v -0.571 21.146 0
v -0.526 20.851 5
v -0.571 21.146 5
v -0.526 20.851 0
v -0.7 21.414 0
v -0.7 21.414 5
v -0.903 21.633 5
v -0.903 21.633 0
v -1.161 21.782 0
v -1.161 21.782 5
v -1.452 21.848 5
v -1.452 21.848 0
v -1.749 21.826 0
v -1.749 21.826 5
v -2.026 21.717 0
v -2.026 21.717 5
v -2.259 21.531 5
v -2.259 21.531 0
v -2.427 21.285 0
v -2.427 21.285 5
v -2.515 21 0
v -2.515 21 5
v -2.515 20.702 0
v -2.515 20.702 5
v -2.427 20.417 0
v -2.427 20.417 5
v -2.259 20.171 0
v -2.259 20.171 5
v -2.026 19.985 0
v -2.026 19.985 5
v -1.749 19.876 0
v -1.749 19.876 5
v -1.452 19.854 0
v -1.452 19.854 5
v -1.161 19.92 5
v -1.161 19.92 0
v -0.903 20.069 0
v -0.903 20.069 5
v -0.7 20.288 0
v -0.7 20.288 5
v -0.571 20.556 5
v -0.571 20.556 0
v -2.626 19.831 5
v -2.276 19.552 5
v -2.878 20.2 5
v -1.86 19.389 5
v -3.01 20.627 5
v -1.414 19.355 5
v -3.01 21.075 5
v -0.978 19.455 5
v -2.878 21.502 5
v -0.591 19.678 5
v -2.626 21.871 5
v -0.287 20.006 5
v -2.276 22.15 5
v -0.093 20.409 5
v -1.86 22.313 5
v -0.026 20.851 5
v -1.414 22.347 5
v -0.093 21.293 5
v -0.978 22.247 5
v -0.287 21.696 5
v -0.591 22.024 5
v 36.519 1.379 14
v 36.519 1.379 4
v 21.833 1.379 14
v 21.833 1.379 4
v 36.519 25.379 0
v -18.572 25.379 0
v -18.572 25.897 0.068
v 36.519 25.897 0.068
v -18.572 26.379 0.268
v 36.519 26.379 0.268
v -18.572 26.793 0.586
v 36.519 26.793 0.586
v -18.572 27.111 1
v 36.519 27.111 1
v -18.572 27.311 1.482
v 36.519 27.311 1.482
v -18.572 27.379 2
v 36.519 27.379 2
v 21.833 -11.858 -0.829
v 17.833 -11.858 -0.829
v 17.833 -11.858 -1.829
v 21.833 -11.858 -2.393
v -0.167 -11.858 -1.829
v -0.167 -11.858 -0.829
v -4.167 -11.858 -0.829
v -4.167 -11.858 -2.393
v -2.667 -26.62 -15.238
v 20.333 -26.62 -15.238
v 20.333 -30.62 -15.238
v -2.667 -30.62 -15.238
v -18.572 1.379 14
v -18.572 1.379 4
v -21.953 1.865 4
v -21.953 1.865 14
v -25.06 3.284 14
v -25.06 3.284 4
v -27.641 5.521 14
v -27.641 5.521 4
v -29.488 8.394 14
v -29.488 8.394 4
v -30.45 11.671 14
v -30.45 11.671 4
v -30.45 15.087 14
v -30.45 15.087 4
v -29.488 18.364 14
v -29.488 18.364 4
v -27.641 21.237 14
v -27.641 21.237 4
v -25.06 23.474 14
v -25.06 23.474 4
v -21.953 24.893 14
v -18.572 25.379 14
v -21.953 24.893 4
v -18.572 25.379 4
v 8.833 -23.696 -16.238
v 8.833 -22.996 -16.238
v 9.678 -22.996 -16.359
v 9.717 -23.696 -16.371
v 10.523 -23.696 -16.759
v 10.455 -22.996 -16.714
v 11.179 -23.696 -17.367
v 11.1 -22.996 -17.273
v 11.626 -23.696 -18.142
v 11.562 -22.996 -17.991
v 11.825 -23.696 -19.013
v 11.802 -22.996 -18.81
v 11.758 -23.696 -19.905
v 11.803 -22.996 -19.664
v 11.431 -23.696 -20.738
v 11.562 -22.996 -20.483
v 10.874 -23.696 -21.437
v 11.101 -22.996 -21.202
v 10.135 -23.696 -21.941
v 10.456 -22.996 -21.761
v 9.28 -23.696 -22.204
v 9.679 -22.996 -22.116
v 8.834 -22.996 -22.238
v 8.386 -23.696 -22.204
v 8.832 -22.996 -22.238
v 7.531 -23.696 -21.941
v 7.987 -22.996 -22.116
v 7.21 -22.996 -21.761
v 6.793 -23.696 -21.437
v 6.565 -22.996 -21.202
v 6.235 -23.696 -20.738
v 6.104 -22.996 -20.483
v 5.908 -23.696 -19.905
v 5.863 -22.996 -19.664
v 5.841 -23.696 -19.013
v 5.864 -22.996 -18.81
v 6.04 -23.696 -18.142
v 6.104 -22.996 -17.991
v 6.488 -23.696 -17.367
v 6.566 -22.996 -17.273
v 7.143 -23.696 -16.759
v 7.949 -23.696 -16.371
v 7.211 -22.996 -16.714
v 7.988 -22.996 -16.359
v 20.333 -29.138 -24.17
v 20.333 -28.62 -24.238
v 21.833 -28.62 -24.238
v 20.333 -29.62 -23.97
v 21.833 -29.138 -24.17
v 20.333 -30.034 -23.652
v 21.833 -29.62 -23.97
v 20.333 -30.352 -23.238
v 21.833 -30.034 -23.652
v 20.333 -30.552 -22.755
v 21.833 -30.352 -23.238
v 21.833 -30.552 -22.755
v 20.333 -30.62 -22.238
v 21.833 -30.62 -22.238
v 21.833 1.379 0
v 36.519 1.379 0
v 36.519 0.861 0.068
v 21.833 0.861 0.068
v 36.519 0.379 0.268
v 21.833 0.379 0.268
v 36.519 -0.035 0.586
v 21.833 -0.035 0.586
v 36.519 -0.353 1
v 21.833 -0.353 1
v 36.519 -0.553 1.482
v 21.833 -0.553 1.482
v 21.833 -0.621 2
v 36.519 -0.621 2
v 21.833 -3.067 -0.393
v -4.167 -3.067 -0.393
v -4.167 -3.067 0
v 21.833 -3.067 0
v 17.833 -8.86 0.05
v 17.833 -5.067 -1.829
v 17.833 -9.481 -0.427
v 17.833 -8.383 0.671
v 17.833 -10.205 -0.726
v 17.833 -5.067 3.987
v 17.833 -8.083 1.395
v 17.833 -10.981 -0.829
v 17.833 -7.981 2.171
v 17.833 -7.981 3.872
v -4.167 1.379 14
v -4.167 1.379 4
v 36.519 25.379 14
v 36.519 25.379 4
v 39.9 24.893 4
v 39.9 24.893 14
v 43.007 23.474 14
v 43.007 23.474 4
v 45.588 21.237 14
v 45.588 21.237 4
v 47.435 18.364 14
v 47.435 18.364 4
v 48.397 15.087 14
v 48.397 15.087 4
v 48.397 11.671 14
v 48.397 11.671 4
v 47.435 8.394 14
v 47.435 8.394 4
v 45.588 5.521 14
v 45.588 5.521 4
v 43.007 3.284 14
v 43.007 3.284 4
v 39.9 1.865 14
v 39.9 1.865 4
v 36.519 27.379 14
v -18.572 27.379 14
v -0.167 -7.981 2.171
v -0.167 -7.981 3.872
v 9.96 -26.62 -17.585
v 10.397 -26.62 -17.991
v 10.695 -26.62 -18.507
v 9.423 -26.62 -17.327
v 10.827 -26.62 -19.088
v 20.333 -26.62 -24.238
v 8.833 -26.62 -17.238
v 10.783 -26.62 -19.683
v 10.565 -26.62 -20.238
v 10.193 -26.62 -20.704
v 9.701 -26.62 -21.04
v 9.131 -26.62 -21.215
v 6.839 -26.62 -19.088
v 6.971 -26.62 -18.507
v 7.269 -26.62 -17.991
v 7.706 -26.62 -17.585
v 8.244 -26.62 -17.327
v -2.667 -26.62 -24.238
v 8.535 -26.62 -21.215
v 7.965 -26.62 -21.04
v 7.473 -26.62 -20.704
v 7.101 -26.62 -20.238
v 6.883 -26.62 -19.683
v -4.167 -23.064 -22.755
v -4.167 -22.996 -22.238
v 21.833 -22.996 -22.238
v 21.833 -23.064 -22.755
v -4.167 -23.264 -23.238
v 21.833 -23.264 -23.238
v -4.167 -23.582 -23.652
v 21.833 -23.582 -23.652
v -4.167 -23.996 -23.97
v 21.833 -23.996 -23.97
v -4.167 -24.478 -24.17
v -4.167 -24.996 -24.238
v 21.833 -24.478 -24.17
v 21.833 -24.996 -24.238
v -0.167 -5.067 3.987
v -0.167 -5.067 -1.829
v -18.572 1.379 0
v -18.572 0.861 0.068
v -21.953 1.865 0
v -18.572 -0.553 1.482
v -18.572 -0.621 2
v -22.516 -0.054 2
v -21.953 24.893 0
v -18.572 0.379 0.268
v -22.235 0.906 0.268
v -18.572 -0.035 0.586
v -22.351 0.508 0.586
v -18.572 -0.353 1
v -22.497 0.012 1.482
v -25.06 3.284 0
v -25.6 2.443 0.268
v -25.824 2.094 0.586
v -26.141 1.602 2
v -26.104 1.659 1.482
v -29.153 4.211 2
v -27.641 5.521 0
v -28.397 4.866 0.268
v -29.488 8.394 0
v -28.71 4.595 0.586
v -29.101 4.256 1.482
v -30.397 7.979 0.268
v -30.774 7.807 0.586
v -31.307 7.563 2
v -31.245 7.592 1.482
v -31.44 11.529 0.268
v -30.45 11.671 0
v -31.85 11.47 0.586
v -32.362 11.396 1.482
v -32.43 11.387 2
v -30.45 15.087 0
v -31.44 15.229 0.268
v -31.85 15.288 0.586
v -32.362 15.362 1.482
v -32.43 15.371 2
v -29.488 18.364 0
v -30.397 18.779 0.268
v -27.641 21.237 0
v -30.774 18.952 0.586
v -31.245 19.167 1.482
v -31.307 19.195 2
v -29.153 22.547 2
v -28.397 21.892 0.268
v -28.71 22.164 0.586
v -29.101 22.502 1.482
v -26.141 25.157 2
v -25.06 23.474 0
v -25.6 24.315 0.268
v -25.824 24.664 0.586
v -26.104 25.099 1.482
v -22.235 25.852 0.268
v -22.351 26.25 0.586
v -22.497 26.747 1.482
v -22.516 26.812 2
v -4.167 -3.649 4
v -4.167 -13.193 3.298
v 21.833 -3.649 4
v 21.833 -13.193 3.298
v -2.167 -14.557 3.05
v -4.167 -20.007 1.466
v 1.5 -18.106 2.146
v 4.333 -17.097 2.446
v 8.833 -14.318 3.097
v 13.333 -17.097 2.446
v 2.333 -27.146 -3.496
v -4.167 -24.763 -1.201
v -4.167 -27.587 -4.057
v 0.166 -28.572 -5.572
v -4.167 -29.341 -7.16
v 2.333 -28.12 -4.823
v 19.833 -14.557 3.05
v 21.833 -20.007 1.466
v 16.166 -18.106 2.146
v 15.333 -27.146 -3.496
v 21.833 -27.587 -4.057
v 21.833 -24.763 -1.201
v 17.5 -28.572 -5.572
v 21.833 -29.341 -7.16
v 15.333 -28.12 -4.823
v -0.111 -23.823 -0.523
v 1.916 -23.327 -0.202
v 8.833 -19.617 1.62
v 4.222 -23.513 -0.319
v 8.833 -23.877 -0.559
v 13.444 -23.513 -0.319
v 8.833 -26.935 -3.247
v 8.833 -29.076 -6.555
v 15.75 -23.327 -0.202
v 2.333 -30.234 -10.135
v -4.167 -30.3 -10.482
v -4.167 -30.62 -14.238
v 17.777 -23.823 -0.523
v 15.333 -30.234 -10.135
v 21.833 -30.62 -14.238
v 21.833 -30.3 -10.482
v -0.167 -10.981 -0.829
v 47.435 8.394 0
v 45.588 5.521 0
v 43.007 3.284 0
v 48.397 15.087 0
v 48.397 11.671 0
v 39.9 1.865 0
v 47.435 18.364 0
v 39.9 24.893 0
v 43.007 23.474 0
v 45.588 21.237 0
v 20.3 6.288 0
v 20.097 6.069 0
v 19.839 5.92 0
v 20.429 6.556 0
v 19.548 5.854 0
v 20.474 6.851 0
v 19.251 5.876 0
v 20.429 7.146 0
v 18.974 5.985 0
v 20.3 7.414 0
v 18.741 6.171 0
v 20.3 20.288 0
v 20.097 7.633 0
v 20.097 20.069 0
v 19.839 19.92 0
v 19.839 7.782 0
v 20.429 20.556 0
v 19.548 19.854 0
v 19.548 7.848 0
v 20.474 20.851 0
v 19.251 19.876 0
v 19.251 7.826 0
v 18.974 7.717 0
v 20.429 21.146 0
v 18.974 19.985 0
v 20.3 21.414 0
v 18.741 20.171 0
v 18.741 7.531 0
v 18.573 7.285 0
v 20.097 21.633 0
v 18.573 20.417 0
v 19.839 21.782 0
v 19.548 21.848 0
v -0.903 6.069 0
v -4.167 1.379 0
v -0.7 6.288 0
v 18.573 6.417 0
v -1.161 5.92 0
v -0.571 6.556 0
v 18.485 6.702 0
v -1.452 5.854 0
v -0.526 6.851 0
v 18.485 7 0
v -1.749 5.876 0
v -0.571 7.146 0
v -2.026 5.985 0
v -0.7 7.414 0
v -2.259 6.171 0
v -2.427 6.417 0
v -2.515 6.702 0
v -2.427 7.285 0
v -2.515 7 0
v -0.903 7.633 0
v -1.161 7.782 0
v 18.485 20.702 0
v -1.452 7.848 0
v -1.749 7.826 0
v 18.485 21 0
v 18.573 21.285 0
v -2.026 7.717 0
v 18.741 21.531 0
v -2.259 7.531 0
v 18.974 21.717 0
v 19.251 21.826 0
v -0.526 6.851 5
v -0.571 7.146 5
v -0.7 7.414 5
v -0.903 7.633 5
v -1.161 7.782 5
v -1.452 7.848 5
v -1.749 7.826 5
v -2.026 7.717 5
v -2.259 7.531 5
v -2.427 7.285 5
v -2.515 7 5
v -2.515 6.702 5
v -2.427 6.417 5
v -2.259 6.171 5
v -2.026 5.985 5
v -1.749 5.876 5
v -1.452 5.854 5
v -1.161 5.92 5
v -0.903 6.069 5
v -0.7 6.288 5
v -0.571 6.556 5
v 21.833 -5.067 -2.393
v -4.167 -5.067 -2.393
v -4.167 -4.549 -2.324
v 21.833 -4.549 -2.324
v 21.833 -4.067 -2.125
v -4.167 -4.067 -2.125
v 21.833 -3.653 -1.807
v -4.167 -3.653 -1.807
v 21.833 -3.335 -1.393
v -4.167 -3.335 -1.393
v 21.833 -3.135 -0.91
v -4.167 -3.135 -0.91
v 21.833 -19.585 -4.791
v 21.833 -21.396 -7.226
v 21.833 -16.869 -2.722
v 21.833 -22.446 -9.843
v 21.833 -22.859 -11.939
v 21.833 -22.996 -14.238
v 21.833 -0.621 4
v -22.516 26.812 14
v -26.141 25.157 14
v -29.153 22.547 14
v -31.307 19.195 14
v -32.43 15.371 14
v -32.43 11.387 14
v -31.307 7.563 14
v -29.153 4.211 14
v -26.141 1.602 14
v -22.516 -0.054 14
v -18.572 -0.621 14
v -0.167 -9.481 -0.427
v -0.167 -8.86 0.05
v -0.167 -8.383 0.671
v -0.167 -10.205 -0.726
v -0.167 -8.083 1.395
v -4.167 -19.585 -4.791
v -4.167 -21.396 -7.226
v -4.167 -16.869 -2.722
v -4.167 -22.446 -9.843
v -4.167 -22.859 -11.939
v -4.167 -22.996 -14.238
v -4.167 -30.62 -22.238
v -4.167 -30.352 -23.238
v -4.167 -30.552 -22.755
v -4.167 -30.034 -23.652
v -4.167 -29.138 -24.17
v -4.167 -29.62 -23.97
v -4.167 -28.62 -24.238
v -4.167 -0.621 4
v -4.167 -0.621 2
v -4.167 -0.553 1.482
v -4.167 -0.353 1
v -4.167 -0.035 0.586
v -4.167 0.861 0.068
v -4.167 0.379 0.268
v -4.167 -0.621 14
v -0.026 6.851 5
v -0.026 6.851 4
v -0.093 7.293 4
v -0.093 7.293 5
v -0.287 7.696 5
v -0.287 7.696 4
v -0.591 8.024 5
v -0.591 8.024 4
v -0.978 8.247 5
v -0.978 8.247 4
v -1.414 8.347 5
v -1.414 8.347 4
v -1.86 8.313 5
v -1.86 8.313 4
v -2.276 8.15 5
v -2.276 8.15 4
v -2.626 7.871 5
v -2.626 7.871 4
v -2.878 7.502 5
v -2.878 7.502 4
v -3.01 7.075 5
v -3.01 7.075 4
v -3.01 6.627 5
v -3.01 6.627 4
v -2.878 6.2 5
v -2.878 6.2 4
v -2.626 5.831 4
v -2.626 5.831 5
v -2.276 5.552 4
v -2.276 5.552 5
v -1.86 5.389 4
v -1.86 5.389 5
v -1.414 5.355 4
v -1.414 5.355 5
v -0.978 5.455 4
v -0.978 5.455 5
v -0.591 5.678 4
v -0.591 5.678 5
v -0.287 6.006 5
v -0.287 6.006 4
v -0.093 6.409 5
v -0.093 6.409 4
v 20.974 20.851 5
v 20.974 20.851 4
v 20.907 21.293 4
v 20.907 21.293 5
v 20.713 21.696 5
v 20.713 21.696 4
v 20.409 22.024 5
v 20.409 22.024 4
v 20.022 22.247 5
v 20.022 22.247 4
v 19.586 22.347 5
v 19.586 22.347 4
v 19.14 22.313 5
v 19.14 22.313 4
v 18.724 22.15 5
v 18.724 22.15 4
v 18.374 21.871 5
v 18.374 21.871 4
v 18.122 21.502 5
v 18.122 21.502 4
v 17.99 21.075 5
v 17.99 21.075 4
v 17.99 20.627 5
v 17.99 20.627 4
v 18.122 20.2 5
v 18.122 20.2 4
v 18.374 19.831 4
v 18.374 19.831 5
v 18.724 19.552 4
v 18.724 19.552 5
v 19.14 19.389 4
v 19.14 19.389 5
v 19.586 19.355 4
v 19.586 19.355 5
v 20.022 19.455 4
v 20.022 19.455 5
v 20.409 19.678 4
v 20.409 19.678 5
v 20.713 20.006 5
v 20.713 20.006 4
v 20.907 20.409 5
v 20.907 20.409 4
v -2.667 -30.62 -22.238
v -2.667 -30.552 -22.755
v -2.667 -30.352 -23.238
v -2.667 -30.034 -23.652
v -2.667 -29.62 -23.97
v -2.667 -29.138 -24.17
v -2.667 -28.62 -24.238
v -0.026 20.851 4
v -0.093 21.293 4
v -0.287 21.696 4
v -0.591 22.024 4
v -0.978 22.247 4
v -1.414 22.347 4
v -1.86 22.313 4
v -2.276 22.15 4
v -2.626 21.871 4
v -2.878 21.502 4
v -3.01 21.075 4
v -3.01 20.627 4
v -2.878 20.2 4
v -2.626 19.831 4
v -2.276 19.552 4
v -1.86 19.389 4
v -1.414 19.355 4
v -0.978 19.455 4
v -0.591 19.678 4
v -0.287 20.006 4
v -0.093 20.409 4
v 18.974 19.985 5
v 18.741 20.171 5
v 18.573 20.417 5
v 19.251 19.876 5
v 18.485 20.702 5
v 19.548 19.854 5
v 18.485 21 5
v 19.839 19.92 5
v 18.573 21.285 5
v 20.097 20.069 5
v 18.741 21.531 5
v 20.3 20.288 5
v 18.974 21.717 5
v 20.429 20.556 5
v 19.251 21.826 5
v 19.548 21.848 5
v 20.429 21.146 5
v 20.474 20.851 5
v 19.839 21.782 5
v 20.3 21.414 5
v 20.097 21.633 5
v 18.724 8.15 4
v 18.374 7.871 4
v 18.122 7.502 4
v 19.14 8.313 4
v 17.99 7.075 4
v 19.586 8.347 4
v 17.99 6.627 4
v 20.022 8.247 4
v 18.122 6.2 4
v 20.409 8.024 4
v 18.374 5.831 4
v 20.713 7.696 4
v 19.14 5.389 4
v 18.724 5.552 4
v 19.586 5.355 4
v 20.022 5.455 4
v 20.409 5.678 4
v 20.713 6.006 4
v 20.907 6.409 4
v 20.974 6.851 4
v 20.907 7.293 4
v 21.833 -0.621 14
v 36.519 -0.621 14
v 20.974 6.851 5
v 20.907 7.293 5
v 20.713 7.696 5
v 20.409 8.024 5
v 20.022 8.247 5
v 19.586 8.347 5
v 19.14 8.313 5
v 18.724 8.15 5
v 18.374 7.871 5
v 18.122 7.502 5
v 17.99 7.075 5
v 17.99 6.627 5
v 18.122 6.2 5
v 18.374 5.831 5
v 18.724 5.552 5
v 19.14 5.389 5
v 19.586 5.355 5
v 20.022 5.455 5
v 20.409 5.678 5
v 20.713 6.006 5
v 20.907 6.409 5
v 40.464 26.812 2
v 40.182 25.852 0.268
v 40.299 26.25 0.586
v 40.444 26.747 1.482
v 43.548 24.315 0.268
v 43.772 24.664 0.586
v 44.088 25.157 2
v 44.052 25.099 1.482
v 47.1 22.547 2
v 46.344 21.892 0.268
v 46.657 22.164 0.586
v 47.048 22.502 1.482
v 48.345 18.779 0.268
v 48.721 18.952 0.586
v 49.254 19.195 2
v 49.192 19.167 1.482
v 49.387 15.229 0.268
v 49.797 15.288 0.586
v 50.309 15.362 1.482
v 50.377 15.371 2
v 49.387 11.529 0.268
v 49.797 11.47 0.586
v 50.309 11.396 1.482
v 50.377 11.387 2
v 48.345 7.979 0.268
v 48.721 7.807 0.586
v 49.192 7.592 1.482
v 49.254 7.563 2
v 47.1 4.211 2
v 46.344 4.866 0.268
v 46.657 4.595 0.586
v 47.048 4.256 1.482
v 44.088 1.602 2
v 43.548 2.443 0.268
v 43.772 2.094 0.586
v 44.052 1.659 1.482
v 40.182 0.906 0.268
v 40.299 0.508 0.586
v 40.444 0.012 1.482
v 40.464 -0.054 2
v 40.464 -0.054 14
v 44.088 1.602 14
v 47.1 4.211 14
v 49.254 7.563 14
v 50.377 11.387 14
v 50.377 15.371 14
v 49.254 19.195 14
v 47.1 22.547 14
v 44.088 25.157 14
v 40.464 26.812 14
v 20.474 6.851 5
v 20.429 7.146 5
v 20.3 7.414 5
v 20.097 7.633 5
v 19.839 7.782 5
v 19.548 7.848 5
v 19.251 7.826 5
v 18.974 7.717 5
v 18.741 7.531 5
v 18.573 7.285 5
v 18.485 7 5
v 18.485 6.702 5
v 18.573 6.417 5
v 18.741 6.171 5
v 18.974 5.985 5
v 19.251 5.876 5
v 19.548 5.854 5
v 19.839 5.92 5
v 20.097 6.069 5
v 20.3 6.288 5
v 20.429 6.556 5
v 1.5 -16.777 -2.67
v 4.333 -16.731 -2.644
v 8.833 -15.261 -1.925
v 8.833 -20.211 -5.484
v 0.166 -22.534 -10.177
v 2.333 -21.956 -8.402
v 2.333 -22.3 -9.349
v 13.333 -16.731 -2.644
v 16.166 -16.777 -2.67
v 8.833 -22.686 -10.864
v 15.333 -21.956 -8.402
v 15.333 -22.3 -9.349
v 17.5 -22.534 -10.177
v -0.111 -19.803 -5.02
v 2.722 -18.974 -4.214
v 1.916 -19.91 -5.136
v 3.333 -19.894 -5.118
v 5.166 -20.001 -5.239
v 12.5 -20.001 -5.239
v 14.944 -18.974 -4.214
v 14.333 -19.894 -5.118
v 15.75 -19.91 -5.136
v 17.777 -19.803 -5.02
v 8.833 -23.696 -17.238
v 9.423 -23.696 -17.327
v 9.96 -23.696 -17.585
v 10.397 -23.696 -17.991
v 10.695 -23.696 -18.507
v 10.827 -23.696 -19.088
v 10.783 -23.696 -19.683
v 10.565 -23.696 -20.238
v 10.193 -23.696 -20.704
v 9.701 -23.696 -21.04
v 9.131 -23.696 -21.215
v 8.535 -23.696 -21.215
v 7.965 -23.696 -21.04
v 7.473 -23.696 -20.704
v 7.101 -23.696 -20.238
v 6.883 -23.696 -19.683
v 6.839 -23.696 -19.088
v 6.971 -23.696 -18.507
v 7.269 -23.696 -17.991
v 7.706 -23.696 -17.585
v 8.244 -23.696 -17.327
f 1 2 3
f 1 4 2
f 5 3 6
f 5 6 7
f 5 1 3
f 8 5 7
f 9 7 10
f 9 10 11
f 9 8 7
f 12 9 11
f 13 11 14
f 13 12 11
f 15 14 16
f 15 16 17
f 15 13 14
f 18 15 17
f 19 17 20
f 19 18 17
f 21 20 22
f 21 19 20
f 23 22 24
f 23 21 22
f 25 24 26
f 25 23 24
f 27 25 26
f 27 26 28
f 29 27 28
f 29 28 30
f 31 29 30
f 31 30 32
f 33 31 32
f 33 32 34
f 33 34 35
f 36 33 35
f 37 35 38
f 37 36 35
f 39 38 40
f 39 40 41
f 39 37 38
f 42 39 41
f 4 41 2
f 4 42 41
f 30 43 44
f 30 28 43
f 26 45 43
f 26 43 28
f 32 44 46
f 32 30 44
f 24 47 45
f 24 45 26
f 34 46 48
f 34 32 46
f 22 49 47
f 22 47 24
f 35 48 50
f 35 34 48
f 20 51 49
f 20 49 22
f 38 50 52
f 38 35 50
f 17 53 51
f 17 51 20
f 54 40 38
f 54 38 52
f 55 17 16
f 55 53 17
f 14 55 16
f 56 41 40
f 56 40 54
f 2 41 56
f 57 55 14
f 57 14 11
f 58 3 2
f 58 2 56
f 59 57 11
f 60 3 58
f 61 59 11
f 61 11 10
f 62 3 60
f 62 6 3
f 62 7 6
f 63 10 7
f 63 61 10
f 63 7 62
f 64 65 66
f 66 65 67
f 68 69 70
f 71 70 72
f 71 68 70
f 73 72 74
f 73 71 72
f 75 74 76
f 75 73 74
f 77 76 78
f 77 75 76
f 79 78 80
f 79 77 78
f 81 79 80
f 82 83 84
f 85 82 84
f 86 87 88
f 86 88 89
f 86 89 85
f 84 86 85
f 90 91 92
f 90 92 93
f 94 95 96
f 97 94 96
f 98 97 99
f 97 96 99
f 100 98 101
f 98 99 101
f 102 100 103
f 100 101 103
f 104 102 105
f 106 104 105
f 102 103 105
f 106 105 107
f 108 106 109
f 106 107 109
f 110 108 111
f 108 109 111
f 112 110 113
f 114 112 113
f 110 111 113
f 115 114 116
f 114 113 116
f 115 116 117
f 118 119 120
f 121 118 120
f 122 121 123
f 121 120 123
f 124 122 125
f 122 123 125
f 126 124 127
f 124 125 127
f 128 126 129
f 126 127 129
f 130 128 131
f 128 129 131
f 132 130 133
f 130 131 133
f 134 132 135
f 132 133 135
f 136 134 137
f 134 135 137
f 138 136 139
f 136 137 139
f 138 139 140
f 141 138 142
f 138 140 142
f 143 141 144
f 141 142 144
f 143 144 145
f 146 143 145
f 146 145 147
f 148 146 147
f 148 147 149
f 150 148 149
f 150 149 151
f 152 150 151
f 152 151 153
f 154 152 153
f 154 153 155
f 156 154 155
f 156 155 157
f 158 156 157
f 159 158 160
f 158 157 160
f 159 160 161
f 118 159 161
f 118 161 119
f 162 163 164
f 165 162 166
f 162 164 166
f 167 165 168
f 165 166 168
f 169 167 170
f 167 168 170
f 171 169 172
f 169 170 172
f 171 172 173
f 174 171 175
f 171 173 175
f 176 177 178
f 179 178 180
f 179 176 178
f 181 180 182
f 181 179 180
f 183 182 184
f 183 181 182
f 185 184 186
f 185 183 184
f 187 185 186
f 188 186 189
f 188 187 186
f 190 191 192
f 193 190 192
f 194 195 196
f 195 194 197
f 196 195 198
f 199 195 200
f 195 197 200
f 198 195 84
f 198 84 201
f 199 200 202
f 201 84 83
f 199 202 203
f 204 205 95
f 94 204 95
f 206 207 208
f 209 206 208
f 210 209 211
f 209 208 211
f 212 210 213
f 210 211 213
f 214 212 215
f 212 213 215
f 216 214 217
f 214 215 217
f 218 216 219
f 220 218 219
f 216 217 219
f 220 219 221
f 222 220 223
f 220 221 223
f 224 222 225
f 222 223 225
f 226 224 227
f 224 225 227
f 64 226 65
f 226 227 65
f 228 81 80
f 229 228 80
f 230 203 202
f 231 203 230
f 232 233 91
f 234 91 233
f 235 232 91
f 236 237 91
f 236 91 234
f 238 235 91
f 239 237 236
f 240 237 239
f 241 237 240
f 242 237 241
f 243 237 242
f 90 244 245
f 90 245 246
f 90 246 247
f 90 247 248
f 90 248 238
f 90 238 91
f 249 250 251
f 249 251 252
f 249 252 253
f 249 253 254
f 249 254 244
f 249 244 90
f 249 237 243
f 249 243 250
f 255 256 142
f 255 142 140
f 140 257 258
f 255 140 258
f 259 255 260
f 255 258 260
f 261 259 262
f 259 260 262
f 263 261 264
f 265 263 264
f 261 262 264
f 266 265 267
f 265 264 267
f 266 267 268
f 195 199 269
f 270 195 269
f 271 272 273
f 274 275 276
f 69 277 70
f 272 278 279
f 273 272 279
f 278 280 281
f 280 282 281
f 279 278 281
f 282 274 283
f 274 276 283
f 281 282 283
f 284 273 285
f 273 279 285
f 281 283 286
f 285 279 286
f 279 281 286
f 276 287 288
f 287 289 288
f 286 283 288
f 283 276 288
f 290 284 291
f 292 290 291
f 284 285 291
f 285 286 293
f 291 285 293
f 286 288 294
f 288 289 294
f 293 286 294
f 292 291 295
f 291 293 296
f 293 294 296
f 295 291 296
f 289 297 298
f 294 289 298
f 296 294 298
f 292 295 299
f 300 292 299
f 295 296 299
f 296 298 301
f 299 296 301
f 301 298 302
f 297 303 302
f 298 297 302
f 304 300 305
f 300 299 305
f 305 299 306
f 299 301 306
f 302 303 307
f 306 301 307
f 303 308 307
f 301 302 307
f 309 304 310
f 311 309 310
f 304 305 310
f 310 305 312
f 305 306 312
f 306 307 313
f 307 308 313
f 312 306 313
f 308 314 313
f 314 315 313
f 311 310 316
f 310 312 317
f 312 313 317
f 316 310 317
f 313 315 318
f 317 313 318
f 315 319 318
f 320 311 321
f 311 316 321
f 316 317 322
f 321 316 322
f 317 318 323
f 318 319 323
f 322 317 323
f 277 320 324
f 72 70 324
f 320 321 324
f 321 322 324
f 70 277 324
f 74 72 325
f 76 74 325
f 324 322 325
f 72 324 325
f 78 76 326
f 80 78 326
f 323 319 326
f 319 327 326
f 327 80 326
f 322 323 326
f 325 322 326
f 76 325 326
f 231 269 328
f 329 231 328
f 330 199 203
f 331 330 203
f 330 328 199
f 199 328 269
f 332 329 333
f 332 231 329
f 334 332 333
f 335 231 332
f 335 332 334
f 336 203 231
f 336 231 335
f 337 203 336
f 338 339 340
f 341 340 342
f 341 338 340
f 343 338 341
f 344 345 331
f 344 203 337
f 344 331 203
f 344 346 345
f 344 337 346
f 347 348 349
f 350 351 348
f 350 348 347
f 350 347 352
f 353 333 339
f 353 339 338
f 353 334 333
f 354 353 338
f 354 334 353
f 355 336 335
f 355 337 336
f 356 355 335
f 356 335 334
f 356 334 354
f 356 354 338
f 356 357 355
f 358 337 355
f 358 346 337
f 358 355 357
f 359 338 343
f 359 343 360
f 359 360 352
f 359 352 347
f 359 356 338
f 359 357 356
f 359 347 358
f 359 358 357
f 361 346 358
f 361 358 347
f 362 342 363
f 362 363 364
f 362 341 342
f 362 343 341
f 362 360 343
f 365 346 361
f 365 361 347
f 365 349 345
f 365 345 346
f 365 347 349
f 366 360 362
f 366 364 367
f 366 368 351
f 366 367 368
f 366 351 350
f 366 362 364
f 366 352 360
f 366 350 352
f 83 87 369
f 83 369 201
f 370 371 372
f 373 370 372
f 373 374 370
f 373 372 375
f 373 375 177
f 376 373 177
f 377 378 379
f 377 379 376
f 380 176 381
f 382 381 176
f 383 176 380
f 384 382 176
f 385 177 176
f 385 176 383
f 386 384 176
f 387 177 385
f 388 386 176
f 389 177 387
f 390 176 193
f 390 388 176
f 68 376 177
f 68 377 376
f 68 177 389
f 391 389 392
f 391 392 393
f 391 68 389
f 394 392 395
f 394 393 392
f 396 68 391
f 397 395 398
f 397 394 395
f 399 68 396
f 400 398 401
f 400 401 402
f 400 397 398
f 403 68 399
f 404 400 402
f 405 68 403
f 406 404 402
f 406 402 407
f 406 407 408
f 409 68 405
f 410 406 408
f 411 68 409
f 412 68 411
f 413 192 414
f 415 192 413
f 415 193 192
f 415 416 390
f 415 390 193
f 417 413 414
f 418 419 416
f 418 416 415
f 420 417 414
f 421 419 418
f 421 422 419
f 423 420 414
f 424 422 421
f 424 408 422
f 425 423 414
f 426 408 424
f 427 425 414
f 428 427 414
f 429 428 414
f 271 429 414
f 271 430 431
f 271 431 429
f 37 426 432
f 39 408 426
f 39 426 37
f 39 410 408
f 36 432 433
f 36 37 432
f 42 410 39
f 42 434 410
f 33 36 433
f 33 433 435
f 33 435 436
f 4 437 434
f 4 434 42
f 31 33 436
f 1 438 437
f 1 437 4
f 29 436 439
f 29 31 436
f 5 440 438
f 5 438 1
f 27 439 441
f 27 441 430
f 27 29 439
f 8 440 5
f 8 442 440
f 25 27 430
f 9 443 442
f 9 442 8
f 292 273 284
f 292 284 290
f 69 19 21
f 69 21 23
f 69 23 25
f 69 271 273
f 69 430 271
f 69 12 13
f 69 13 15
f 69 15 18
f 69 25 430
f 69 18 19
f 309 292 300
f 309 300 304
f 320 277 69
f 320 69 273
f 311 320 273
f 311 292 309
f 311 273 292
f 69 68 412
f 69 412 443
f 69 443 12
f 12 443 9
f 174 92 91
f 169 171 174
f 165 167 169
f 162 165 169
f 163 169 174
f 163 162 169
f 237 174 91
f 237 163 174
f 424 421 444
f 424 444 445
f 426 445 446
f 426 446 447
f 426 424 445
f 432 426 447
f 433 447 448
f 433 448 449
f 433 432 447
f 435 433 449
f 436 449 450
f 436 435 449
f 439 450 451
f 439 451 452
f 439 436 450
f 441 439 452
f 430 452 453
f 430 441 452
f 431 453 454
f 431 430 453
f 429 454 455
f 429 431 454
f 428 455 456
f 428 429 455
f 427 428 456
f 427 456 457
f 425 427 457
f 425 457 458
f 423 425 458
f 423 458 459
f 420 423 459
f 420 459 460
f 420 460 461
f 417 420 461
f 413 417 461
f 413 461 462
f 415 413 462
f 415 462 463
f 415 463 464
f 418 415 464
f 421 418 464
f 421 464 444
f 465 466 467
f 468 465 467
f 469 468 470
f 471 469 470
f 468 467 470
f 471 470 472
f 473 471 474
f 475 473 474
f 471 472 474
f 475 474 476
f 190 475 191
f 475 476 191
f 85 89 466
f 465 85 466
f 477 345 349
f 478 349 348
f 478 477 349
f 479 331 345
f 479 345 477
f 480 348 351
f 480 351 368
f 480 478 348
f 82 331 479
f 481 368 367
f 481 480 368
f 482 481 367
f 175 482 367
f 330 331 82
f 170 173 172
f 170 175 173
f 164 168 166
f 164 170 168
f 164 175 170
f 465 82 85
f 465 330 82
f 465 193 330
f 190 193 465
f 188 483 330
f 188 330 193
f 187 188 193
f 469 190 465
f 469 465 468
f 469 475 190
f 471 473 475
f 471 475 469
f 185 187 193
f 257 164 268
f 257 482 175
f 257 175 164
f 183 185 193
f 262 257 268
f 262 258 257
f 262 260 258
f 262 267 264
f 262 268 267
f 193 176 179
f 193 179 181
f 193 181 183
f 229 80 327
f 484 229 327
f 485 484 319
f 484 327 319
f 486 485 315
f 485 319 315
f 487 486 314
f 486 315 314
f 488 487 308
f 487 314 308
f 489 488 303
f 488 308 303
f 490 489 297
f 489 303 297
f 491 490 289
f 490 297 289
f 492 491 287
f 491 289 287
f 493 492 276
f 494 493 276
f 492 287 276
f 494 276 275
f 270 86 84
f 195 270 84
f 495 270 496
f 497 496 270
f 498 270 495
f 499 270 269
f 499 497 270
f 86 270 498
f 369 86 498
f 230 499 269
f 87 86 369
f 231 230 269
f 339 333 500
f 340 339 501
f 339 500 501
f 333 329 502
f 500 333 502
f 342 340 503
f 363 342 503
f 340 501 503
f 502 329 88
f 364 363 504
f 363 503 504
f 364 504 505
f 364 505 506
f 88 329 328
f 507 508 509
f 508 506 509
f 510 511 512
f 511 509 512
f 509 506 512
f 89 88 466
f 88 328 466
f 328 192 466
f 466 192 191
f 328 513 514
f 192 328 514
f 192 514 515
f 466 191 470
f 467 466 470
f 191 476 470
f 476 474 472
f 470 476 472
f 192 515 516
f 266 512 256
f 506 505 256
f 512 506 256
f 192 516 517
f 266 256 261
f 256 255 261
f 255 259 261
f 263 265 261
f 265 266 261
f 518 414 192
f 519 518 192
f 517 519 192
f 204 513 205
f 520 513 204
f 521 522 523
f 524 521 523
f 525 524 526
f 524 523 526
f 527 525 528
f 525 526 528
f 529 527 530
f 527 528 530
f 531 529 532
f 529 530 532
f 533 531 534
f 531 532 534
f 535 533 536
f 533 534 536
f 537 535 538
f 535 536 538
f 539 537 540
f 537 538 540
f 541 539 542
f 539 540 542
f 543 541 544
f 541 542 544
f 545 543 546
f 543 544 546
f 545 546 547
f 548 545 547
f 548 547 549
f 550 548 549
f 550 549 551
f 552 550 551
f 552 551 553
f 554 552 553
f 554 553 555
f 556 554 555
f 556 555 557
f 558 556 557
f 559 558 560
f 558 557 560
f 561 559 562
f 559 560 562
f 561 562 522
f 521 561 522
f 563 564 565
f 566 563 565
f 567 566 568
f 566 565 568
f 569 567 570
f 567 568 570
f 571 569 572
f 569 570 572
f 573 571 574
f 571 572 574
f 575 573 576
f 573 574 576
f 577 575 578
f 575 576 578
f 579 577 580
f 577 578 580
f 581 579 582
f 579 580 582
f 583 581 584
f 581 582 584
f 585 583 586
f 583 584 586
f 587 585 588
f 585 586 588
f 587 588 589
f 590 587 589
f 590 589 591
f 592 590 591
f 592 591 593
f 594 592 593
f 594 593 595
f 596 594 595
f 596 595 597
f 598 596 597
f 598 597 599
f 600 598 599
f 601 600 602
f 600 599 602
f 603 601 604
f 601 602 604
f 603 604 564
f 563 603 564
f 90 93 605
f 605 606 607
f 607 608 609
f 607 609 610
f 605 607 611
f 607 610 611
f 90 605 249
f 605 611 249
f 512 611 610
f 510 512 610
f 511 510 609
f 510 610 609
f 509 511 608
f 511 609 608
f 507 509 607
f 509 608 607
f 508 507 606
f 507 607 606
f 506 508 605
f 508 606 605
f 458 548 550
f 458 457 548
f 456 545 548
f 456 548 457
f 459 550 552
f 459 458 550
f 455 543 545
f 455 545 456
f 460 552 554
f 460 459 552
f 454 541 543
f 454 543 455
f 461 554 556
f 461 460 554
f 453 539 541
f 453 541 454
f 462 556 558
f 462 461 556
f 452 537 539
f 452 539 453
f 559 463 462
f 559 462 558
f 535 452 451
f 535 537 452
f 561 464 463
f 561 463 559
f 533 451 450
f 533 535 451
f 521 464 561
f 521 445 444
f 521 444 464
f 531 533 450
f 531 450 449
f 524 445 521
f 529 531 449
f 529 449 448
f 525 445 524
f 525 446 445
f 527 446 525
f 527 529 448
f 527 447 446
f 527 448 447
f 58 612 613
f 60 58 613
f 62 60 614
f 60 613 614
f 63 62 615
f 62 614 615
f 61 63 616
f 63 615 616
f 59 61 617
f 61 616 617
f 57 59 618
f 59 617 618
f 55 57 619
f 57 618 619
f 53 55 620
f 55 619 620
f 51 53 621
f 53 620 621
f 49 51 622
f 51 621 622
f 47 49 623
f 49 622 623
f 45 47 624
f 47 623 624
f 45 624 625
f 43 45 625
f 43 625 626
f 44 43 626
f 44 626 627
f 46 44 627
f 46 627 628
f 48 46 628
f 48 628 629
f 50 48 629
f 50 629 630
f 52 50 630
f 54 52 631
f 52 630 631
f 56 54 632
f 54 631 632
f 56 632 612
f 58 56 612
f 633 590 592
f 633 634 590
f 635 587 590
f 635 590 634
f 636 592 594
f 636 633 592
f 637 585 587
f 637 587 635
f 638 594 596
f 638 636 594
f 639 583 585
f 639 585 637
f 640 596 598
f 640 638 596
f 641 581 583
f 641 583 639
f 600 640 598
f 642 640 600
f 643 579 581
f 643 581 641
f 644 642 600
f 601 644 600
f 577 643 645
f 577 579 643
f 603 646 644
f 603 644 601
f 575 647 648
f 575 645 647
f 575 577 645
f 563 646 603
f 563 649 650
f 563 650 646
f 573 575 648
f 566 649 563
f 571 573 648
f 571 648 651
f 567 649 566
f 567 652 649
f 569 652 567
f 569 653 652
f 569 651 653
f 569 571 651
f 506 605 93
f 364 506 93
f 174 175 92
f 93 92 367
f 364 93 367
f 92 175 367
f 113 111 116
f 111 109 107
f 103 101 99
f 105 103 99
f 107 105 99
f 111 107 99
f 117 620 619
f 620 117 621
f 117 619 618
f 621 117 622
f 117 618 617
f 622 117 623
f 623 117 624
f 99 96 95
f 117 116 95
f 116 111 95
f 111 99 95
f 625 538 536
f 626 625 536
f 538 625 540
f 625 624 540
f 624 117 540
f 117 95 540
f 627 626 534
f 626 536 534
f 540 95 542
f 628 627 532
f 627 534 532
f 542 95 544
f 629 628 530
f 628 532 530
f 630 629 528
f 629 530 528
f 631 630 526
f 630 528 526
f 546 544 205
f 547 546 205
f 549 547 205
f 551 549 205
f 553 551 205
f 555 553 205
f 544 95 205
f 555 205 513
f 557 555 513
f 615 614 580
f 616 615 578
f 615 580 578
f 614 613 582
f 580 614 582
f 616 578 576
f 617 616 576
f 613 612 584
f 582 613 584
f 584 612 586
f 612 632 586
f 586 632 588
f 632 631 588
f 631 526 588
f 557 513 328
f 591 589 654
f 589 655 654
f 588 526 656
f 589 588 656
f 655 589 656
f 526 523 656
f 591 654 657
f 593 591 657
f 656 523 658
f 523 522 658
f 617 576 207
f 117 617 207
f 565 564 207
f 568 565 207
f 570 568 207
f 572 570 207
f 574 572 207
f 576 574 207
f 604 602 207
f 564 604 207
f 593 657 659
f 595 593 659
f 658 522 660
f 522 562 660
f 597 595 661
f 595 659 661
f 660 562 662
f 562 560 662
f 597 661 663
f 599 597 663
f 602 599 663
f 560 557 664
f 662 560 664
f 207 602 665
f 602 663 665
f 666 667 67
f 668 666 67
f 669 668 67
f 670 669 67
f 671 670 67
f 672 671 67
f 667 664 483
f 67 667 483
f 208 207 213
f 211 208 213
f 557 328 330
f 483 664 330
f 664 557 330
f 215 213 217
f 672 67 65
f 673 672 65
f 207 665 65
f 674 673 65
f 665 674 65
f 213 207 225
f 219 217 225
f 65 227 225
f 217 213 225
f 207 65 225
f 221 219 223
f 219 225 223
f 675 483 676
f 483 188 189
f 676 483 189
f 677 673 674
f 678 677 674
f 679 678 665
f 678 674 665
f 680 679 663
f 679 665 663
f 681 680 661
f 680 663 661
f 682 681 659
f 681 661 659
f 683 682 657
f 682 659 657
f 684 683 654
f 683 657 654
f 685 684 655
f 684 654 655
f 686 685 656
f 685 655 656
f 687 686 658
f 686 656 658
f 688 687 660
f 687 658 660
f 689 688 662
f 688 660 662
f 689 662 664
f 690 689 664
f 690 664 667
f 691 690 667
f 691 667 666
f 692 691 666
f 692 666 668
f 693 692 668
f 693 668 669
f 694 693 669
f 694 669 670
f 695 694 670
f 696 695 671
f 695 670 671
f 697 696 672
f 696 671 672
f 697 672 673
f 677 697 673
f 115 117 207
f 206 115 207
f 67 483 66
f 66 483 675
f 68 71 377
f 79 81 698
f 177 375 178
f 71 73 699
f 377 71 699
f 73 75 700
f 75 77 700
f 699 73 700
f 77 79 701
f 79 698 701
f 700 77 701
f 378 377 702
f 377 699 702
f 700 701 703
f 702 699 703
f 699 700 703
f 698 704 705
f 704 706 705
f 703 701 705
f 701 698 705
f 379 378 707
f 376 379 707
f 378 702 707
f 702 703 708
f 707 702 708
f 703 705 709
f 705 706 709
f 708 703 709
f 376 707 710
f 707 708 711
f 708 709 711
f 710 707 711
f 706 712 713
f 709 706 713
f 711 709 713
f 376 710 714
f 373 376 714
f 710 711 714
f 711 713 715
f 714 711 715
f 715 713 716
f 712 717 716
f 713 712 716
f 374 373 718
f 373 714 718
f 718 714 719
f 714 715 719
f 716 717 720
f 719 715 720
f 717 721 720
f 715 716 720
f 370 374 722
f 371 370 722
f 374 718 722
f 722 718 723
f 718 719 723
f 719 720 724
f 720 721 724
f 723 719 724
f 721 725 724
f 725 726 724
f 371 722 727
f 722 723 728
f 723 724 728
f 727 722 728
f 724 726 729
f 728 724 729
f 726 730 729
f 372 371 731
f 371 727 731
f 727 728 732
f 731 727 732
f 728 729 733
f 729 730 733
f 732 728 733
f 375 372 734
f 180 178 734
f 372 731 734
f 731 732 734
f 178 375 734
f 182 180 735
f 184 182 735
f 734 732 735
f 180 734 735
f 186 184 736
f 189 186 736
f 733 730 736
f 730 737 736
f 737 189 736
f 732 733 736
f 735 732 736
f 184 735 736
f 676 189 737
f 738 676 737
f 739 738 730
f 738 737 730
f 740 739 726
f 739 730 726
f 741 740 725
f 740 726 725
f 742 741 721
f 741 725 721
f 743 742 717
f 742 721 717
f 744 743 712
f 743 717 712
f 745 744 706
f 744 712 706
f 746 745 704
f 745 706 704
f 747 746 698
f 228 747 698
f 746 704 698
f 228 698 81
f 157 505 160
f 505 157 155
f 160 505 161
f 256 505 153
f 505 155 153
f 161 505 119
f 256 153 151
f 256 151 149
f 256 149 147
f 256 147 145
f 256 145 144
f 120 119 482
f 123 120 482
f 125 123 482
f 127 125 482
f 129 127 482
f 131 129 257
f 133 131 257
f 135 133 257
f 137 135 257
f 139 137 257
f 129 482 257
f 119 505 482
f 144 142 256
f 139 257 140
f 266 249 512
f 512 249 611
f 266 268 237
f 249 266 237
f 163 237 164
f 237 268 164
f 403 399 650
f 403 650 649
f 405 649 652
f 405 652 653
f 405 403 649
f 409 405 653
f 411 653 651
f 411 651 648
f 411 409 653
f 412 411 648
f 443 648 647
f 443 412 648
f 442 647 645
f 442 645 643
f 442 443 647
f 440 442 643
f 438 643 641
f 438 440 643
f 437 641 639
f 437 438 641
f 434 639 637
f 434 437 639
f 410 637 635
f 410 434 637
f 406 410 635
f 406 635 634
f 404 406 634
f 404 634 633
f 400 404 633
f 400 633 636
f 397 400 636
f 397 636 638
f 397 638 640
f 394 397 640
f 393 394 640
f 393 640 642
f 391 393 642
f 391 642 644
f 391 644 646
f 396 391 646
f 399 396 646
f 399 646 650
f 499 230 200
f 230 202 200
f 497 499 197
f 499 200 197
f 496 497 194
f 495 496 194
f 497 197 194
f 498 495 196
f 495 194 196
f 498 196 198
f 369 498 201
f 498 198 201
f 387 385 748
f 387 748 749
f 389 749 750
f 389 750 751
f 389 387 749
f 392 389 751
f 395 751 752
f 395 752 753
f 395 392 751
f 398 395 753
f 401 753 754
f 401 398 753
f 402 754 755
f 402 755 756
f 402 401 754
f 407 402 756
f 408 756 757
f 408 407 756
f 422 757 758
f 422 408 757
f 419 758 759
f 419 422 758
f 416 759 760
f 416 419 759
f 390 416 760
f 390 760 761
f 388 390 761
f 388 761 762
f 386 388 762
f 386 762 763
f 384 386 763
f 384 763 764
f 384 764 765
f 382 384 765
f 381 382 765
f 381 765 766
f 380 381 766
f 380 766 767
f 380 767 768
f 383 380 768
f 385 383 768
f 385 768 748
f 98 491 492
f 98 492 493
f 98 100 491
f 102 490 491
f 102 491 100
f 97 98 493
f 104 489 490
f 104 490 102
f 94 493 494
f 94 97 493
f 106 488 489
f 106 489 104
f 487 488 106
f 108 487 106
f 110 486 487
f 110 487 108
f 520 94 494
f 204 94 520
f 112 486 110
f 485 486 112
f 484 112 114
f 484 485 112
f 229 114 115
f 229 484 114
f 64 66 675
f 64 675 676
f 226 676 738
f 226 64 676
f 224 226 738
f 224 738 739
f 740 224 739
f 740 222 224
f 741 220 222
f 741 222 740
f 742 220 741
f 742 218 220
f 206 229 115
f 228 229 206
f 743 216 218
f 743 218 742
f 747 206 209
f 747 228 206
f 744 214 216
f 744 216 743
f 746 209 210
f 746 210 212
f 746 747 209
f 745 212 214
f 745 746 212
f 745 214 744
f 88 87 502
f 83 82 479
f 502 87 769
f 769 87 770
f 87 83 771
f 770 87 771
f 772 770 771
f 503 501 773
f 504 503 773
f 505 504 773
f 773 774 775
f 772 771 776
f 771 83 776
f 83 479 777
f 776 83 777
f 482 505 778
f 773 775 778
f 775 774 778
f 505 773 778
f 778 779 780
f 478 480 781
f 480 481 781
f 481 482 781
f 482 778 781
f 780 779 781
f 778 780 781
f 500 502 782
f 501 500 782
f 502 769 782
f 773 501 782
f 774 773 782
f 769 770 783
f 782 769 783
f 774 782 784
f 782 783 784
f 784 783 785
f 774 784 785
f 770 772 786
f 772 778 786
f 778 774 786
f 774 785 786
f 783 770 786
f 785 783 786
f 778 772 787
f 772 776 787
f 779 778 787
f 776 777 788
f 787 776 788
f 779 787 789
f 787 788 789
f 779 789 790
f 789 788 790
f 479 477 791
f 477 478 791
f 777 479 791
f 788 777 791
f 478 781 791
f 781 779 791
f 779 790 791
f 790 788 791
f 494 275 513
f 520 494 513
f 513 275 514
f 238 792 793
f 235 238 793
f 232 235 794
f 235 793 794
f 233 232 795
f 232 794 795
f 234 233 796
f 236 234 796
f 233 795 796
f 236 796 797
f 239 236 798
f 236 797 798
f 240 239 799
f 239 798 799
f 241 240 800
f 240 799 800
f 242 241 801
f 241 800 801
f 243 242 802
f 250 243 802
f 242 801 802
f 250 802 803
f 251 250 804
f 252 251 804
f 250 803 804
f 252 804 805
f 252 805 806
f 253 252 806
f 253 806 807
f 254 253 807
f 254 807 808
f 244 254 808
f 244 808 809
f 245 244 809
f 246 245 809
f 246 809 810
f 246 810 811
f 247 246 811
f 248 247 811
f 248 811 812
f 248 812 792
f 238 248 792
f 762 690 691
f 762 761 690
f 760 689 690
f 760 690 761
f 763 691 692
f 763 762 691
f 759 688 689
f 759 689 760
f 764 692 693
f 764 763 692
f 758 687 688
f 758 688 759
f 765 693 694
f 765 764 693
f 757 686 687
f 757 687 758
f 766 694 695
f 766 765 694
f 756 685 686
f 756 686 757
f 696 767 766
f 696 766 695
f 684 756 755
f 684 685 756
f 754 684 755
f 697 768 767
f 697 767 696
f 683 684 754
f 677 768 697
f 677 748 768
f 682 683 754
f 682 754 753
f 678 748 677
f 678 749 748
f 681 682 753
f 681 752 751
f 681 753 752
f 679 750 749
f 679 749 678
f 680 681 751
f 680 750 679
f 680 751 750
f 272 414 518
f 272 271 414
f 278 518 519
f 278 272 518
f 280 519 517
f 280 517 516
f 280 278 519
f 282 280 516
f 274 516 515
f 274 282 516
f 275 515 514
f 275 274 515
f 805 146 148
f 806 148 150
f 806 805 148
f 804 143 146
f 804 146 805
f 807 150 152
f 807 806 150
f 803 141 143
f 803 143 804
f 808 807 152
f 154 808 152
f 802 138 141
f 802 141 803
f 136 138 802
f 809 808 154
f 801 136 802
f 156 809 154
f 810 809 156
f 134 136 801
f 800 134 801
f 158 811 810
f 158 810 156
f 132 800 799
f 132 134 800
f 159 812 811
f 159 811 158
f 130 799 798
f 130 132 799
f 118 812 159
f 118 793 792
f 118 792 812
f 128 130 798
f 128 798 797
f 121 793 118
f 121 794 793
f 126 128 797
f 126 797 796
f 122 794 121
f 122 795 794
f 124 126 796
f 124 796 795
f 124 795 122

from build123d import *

# Parameters (mm, degrees)
SKETCH1_R                = 1
BOSS_EXTRUDE2_DEPTH      = 4
BOSS_EXTRUDE3_DEPTH      = 10
SKETCH3_W                = 26
SKETCH3_H                = 10
CUT_EXTRUDE1_DEPTH       = 10
BOSS_EXTRUDE4_DEPTH      = 26
SKETCH8_W                = 23
SKETCH8_H                = 4
CUT_EXTRUDE5_DEPTH       = 9
SKETCH10_R               = 3
CUT_EXTRUDE7_DEPTH       = 0.7
SKETCH11_R               = 2
CUT_EXTRUDE8_DEPTH       = 10.7
BOSS_EXTRUDE5_START      = -26
BOSS_EXTRUDE5_DEPTH      = 26
SKETCH14_W               = 18
SKETCH14_H               = 1
CUT_EXTRUDE10_DEPTH      = 5
CUT_EXTRUDE11_DEPTH      = 1
CUT_EXTRUDE11_DEPTH_BACK = 5.5
SKETCH15_W               = 18
SKETCH15_H               = 2.914160071
SKETCH16_R               = 1.5
SKETCH16_R_2             = 1
BOSS_EXTRUDE6_DEPTH      = 1
FILLET3_R                = 2
FILLET4_R                = 3


# Read off the part's stored shape, not the designer's step: Boss-Extrude5
with BuildPart() as part:
    # Sketch1 → Boss-Extrude2 (new body)
    with BuildSketch(Plane.XY):
        with BuildLine():
            Line((-18.57209146, 27.379059863), (36.519389128, 27.379059863))
            ThreePointArc((36.519389128, 27.379059863), (50.519389128, 13.379059863), (36.519389128, -0.620940137))
            Line((36.519389128, -0.620940137), (21.833027405, -0.620940137))
            Line((21.833027405, -0.620940137), (21.833027405, -3.648981121))
            Line((21.833027405, -3.648981121), (-4.166972595, -3.648981121))
            Line((-4.166972595, -3.648981121), (-4.166972595, -0.620940137))
            Line((-4.166972595, -0.620940137), (-18.57209146, -0.620940137))
            ThreePointArc((-18.57209146, -0.620940137), (-32.57209146, 13.379059863), (-18.57209146, 27.379059863))
        make_face()
        with Locations((-1.526351166, 20.851018883)):
            Circle(SKETCH1_R, mode=Mode.SUBTRACT)
        with Locations((19.473648834, 20.851018883)):
            Circle(SKETCH1_R, mode=Mode.SUBTRACT)
        with Locations((-1.526351166, 6.851018883)):
            Circle(SKETCH1_R, mode=Mode.SUBTRACT)
        with Locations((19.473648834, 6.851018883)):
            Circle(SKETCH1_R, mode=Mode.SUBTRACT)
    extrude(amount=BOSS_EXTRUDE2_DEPTH)

    # Sketch2 → Boss-Extrude3 (add)
    with BuildSketch(Plane.XY.offset(4)):
        with BuildLine():
            Line((-4.166972595, -0.620940137), (-4.166972595, -0.624002345))
            Line((-4.166972595, -0.624002345), (21.833027405, -0.624002345))
            Line((21.833027405, -0.624002345), (21.833027405, -0.620940137))
            Line((21.833027405, -0.620940137), (36.519389128, -0.620940137))
            ThreePointArc((36.519389128, -0.620940137), (50.519389128, 13.379059863), (36.519389128, 27.379059863))
            Line((36.519389128, 27.379059863), (-18.57209146, 27.379059863))
            ThreePointArc((-18.57209146, 27.379059863), (-32.57209146, 13.379059863), (-18.57209146, -0.620940137))
            Line((-18.57209146, -0.620940137), (-4.166972595, -0.620940137))
        make_face()
        with BuildLine():
            ThreePointArc((-18.57209146, 1.379059863), (-30.57209146, 13.379059863), (-18.57209146, 25.379059863))
            Line((-18.57209146, 25.379059863), (36.519389128, 25.379059863))
            ThreePointArc((36.519389128, 25.379059863), (48.519389128, 13.379059863), (36.519389128, 1.379059863))
            Line((36.519389128, 1.379059863), (-18.57209146, 1.379059863))
        make_face(mode=Mode.SUBTRACT)
    extrude(amount=BOSS_EXTRUDE3_DEPTH)

    # Sketch3 → Cut-Extrude1 (cut)
    with BuildSketch(Plane.XZ.offset(0.624002345)):
        with Locations((8.833027405, 9)):
            Rectangle(SKETCH3_W, SKETCH3_H)
    extrude(amount=-CUT_EXTRUDE1_DEPTH, mode=Mode.SUBTRACT)

    # Sketch4 → Boss-Extrude4 (add)
    with BuildSketch(Plane(origin=(21.833027405, 0, 0), x_dir=(0, 0, -1), z_dir=(1, 0, 0))):
        with BuildLine():
            Line((-4, -3.648981121), (7.0957e-05, -3.648981121))
            add(Edge.make_bspline(
                [(7.0957e-05, -3.648981121), (7.0957e-05, -22.995880537), (14.23768392, -22.995880537)],
                knots=[0, 0, 0, 1, 1, 1], degree=2))
            Line((14.23768392, -22.995880537), (22.23768392, -22.995880537))
            ThreePointArc((22.23768392, -22.995880537), (23.651897483, -23.581666974), (24.23768392, -24.995880537))
            Line((24.23768392, -24.995880537), (24.23768392, -28.620008298))
            ThreePointArc((24.23768392, -28.620008298), (23.651897483, -30.034221861), (22.23768392, -30.620008298))
            Line((22.23768392, -30.620008298), (14.23768392, -30.620008298))
            add(Edge.make_bspline(
                [(-4, -3.648981121), (-3.999929043, -30.620008298), (14.23768392, -30.620008298)],
                knots=[0, 0, 0, 1, 1, 1], degree=2))
        make_face()
    extrude(amount=-BOSS_EXTRUDE4_DEPTH)

    # Sketch8 → Cut-Extrude5 (cut)
    with BuildSketch(Plane(origin=(0, 0, -24.237684184), x_dir=(-1, 0, 0), z_dir=(0, 0, -1))):
        with Locations((-8.833027405, -28.620008644)):
            Rectangle(SKETCH8_W, SKETCH8_H)
    extrude(amount=-CUT_EXTRUDE5_DEPTH, mode=Mode.SUBTRACT)

    # Sketch10 → Cut-Extrude7 (cut)
    with BuildSketch(Plane(origin=(0, -22.995880711, 0), x_dir=(1, 0, 0), z_dir=(0, 1, 0))):
        with Locations(Location((8.833027405, 19.237684184, 0), (0, 0, 270))):
            Circle(SKETCH10_R)
    extrude(amount=-CUT_EXTRUDE7_DEPTH, mode=Mode.SUBTRACT)

    # Sketch11 → Cut-Extrude8 (cut)
    with BuildSketch(Plane(origin=(0, -23.695880711, 0), x_dir=(1, 0, 0), z_dir=(0, 1, 0))):
        with Locations(Location((8.833027405, 19.23768392, 0), (0, 0, 270))):
            Circle(SKETCH11_R)
    extrude(amount=-CUT_EXTRUDE8_DEPTH, mode=Mode.SUBTRACT)

    # Boss-Extrude5 outline → Boss-Extrude5 (add)
    with BuildSketch(Plane(origin=(21.833027405, 0, 0), x_dir=(0, 0, -1), z_dir=(1, 0, 0)).offset(BOSS_EXTRUDE5_START)):
        with BuildLine():
            ThreePointArc((2.392558217, -5.066956781), (1.80677178, -3.652743218), (0.392558217, -3.066956781))
            Line((0.392558217, -3.066956781), (-1, -3.066956781))
            Line((-1, -3.066956781), (-1, -3.648981121))
            Line((-1, -3.648981121), (7.0828e-05, -3.648981121))
            add(Edge.make_bspline(
                [(0.828692106, -11.857711885), (7.0827e-05, -8.316335967), (7.0828e-05, -3.648981121)],
                knots=[0.758754376, 0.758754376, 0.758754376, 1, 1, 1], degree=2))
            Line((0.828692106, -11.857711885), (2.392558217, -11.857711885))
            Line((2.392558217, -11.857711885), (2.392558217, -5.066956781))
        make_face()
    extrude(amount=BOSS_EXTRUDE5_DEPTH)

    # Sketch14 → Cut-Extrude10 (cut)
    with BuildSketch(Plane.XZ.offset(11.857711885)):
        with Locations((8.833027405, -1.328692104)):
            Rectangle(SKETCH14_W, SKETCH14_H)
    extrude(amount=-CUT_EXTRUDE10_DEPTH, mode=Mode.SUBTRACT)

    # Sketch15 → Cut-Extrude11 (cut, two sides: drawn at the far end of the back side and taken through both)
    with BuildSketch(Plane(origin=(0, 0, -0.828692104), x_dir=(-1, 0, 0), z_dir=(0, 0, -1)).offset(-CUT_EXTRUDE11_DEPTH_BACK)):
        with Locations((-8.833027405, -6.524036817)):
            Rectangle(SKETCH15_W, SKETCH15_H)
    extrude(amount=CUT_EXTRUDE11_DEPTH + CUT_EXTRUDE11_DEPTH_BACK, mode=Mode.SUBTRACT)

    # Sketch16 → Boss-Extrude6 (add)
    # profile 1 of 4: a face of its own
    with BuildSketch(Plane.XY.offset(4)):
        with Locations((-1.526351166, 20.851018883)):
            Circle(SKETCH16_R)
        with Locations((-1.526351166, 20.851018883)):
            Circle(SKETCH16_R_2, mode=Mode.SUBTRACT)
    # profile 2 of 4: a face of its own
    with BuildSketch(Plane.XY.offset(4)):
        with Locations((-1.526351166, 6.851018883)):
            Circle(SKETCH16_R)
        with Locations((-1.526351166, 6.851018883)):
            Circle(SKETCH16_R_2, mode=Mode.SUBTRACT)
    # profile 3 of 4: a face of its own
    with BuildSketch(Plane.XY.offset(4)):
        with Locations((19.473648834, 20.851018883)):
            Circle(SKETCH16_R)
        with Locations((19.473648834, 20.851018883)):
            Circle(SKETCH16_R_2, mode=Mode.SUBTRACT)
    # profile 4 of 4: a face of its own
    with BuildSketch(Plane.XY.offset(4)):
        with Locations((19.473648834, 6.851018883)):
            Circle(SKETCH16_R)
        with Locations((19.473648834, 6.851018883)):
            Circle(SKETCH16_R_2, mode=Mode.SUBTRACT)
    extrude(amount=BOSS_EXTRUDE6_DEPTH)

    # Fillet3
    fillet3_edges = [part.edges().sort_by_distance(p)[0] for p in [
        (50.519389128, 13.379059863, 0),
        (29.176208267, -0.620940137, 0),
        (-11.369532027, -0.620940137, 0),
        (-32.57209146, 13.379059863, 0),
        (8.973648834, 27.379059863, 0),
    ]]
    fillet(fillet3_edges, radius=FILLET3_R)

    # Fillet4
    fillet4_edges = [part.edges().sort_by_distance(p)[0] for p in [
        (8.833027405, -7.981116852, -0.828692104),
    ]]
    fillet(fillet4_edges, radius=FILLET4_R)


solid = part.part
